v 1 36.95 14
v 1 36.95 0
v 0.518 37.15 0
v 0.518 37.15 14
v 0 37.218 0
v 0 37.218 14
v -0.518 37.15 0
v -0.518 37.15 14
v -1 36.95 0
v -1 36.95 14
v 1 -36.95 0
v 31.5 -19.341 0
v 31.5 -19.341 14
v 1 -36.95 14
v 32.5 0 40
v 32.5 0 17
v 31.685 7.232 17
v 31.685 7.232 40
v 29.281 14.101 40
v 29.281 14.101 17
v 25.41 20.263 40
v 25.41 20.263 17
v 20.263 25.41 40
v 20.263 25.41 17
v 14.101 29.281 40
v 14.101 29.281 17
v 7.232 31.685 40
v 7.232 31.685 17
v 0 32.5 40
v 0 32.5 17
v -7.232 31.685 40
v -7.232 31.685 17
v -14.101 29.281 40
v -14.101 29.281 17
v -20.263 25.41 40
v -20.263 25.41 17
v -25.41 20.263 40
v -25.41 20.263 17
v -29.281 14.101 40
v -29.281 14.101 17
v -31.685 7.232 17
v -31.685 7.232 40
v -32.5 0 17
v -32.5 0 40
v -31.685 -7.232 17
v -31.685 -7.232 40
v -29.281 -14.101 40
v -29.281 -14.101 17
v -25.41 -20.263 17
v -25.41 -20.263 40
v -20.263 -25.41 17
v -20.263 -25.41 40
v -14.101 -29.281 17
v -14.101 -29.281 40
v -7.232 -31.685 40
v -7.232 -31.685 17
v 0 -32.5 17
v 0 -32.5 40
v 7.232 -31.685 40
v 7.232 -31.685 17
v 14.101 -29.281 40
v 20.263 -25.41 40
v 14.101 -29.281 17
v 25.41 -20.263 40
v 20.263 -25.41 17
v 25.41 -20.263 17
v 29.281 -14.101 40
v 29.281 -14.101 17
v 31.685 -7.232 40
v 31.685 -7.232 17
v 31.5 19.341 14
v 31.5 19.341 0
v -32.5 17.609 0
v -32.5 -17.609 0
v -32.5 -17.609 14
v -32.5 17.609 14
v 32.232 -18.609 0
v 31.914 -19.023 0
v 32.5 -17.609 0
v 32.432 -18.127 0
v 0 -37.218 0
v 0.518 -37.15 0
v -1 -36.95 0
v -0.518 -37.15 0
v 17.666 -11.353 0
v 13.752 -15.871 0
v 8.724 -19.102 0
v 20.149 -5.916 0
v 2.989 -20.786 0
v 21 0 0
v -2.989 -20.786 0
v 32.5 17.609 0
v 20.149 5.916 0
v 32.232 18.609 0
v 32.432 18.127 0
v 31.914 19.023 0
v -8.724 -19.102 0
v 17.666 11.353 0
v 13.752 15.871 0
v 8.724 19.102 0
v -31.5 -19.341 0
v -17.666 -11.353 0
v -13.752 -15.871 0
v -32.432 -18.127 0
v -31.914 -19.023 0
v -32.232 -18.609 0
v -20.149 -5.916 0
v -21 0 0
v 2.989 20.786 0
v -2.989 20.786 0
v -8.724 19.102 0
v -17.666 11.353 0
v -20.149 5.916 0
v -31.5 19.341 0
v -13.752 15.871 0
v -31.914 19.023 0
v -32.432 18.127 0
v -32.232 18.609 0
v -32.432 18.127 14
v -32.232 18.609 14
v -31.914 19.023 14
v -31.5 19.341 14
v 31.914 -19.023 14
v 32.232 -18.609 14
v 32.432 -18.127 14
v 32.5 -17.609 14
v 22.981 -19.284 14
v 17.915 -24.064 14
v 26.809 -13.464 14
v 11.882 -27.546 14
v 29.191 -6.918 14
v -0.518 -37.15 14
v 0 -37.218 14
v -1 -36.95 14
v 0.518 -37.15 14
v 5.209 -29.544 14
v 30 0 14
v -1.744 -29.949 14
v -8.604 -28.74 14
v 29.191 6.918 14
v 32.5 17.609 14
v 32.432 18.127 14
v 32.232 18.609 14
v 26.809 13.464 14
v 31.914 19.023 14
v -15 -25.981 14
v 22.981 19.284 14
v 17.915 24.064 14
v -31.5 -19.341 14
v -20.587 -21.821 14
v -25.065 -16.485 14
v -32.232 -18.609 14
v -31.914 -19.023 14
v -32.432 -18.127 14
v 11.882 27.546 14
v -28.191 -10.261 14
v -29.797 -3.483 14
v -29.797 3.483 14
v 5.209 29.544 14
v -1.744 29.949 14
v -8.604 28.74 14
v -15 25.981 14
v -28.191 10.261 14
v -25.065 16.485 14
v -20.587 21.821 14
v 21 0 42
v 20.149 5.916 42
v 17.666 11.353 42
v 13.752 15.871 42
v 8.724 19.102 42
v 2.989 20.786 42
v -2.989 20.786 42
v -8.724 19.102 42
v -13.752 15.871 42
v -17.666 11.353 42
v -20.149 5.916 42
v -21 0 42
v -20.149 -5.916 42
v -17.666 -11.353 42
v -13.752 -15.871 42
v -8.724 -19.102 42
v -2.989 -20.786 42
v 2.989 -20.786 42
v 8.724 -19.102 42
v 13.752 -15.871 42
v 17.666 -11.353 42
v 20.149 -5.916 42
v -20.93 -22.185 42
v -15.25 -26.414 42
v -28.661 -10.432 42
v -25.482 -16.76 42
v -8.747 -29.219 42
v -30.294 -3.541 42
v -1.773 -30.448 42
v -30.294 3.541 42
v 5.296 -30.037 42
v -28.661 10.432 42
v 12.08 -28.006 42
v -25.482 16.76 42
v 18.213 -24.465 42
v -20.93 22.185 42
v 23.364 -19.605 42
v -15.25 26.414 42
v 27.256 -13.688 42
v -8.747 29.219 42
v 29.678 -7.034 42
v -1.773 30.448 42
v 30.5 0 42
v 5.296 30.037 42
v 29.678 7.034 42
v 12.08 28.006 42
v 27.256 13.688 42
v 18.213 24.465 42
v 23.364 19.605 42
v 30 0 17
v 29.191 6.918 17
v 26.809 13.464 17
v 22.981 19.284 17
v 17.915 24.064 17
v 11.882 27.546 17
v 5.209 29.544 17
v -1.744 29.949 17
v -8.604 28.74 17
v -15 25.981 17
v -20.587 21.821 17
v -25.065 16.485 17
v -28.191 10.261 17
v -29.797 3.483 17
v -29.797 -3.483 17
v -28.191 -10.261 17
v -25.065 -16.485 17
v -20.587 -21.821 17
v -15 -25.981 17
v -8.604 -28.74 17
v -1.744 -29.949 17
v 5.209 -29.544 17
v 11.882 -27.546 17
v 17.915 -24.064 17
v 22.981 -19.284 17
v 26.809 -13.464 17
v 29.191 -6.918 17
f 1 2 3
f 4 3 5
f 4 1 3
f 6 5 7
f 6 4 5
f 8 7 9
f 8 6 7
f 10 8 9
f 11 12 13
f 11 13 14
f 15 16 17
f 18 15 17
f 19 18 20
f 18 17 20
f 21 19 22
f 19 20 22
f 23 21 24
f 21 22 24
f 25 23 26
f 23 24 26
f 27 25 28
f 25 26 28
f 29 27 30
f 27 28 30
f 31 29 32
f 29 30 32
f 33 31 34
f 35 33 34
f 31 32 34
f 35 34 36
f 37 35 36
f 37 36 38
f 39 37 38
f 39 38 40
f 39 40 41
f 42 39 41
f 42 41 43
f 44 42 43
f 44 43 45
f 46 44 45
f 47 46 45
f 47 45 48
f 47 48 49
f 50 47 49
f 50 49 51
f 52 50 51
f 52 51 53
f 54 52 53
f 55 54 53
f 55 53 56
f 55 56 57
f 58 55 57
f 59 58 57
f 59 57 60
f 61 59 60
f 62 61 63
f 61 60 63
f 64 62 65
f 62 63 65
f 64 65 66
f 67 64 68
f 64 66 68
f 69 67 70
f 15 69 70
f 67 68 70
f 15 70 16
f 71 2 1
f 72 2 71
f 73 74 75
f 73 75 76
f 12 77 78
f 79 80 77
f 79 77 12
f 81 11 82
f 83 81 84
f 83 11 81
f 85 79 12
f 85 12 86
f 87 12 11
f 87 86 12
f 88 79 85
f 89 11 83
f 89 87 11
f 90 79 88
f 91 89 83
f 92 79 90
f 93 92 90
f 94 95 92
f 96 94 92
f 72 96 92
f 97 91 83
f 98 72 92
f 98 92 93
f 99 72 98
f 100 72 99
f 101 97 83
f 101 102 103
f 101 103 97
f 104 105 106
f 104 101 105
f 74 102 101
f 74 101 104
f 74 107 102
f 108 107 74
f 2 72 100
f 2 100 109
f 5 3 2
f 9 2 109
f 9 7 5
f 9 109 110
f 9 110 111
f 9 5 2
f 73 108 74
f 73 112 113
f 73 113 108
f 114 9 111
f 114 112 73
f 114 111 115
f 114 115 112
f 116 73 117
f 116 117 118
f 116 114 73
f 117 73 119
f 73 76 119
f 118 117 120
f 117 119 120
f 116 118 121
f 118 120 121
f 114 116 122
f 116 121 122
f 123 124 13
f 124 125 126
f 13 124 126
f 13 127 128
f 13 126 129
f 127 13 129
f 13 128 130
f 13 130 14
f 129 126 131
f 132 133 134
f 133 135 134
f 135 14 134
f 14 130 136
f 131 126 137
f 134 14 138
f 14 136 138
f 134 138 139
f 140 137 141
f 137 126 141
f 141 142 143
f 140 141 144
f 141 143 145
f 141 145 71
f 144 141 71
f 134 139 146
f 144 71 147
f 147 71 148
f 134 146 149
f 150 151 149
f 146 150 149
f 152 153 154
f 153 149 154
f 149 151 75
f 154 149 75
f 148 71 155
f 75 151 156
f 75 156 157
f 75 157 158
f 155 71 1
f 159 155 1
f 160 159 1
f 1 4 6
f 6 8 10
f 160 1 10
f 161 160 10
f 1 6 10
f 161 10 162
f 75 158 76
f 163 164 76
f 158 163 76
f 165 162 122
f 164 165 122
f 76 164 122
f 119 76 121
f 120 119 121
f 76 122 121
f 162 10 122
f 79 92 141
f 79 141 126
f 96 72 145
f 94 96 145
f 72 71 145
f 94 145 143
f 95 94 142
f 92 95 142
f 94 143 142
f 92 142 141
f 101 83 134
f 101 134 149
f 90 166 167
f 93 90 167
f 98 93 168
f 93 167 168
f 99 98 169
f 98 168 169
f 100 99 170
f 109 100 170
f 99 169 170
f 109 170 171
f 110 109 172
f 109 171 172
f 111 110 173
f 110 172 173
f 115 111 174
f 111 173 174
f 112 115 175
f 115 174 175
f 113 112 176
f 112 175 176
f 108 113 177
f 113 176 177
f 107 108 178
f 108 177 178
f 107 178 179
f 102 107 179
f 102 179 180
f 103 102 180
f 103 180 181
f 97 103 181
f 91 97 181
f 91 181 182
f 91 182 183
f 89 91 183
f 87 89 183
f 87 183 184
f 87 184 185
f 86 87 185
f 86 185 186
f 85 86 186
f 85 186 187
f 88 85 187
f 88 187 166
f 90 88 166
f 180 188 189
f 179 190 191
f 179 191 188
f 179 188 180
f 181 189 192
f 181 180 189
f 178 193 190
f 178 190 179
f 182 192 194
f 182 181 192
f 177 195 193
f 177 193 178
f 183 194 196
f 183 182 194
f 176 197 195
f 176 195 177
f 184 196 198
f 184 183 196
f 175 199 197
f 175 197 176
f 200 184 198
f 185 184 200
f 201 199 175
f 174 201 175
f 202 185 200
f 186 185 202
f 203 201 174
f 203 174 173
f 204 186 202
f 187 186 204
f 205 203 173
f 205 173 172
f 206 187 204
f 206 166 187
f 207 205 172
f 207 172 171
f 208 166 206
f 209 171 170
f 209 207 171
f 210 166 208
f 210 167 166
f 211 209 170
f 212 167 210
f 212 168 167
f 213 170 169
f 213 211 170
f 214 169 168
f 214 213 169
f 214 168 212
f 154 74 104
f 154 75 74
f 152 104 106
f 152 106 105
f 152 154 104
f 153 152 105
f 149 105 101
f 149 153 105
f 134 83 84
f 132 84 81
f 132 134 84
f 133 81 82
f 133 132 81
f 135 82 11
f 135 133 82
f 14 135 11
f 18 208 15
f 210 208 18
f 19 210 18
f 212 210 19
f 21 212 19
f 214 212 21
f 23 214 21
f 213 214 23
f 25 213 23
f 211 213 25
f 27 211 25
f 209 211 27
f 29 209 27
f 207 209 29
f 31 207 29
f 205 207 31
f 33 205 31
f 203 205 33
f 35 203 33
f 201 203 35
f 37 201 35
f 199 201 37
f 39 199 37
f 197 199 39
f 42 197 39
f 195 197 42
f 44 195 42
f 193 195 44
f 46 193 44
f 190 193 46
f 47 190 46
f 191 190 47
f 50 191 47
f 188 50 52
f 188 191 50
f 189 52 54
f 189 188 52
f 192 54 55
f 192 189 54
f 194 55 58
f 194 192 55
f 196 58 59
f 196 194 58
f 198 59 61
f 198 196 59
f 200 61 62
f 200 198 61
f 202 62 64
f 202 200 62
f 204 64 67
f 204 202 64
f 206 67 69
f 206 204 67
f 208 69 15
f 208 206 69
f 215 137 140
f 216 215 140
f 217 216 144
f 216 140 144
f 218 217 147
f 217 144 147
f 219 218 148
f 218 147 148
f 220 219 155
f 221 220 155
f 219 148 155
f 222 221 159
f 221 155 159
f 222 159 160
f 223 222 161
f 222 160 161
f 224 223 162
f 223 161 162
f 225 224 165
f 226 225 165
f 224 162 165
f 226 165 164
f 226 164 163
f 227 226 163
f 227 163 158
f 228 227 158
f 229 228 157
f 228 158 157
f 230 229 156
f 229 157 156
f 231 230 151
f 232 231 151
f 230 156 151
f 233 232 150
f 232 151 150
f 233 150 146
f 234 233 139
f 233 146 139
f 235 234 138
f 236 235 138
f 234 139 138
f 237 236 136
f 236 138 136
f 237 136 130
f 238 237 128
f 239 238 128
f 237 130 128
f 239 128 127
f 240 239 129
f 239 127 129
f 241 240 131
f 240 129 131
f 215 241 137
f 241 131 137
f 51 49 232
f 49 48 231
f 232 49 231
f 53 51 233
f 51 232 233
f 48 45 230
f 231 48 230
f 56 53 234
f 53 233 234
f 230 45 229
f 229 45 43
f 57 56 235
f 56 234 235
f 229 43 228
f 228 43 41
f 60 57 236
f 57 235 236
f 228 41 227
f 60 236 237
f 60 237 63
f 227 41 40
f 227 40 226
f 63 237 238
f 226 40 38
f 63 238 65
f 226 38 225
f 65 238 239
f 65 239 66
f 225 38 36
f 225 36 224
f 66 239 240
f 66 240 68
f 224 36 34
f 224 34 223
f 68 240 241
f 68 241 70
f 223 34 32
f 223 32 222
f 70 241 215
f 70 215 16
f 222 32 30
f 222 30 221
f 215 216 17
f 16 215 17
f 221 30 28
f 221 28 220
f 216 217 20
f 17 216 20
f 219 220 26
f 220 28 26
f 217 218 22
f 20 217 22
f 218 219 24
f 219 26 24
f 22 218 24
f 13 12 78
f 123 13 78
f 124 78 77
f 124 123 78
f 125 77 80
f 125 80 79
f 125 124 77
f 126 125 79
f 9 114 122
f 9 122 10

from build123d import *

# Parameters (mm, degrees)
SKETCH1_R           = 32.5
BOSS_EXTRUDE1_DEPTH = 42
CUT_EXTRUDE1_START  = -28
SKETCH2_R           = 32.5
SKETCH2_R_2         = 30
CUT_EXTRUDE1_DEPTH  = 3
BOSS_EXTRUDE2_DEPTH = 14
FILLET1_R           = 2
CHAMFER1_SIZE       = 2
SKETCH4_R           = 21
CUT_EXTRUDE2_DEPTH  = 43


with BuildPart() as part:
    # Sketch1 → Boss-Extrude1 (new body)
    with BuildSketch(Plane.XY):
        Circle(SKETCH1_R)
    extrude(amount=BOSS_EXTRUDE1_DEPTH)

    # Sketch2 → Cut-Extrude1 (cut)
    with BuildSketch(Plane.XY.offset(42).offset(CUT_EXTRUDE1_START)):
        Circle(SKETCH2_R)
        Circle(SKETCH2_R_2, mode=Mode.SUBTRACT)
    extrude(amount=CUT_EXTRUDE1_DEPTH, mode=Mode.SUBTRACT)

    # Sketch3 → Boss-Extrude2 (add)
    with BuildSketch(Plane(origin=(0, 0, 0), x_dir=(-1, 0, 0), z_dir=(0, 0, -1))):
        Polygon((0, 37.527767497), (-32.5, 18.763883749), (-32.5, -18.763883749), (0, -37.527767497), (32.5, -18.763883749), (32.5, 18.763883749), align=None)
    extrude(amount=-BOSS_EXTRUDE2_DEPTH)

    # Fillet1
    fillet1_edges = [part.edges().sort_by_distance(p)[0] for p in [
        (0, 37.527767497, 7),
        (-32.5, 18.763883749, 7),
        (-32.5, -18.763883749, 7),
        (0, -37.527767497, 7),
        (32.5, -18.763883749, 7),
        (32.5, 18.763883749, 7),
    ]]
    fillet(fillet1_edges, radius=FILLET1_R)

    # Chamfer1
    chamfer1_edges = [part.edges().sort_by_distance(p)[0] for p in [
        (-32.5, 0, 42),
    ]]
    chamfer(chamfer1_edges, length=CHAMFER1_SIZE)

    # Sketch4 → Cut-Extrude2 (cut, through all)
    with BuildSketch(Plane.XY.offset(42)):
        Circle(SKETCH4_R)
    extrude(amount=-CUT_EXTRUDE2_DEPTH, mode=Mode.SUBTRACT)


solid = part.part
